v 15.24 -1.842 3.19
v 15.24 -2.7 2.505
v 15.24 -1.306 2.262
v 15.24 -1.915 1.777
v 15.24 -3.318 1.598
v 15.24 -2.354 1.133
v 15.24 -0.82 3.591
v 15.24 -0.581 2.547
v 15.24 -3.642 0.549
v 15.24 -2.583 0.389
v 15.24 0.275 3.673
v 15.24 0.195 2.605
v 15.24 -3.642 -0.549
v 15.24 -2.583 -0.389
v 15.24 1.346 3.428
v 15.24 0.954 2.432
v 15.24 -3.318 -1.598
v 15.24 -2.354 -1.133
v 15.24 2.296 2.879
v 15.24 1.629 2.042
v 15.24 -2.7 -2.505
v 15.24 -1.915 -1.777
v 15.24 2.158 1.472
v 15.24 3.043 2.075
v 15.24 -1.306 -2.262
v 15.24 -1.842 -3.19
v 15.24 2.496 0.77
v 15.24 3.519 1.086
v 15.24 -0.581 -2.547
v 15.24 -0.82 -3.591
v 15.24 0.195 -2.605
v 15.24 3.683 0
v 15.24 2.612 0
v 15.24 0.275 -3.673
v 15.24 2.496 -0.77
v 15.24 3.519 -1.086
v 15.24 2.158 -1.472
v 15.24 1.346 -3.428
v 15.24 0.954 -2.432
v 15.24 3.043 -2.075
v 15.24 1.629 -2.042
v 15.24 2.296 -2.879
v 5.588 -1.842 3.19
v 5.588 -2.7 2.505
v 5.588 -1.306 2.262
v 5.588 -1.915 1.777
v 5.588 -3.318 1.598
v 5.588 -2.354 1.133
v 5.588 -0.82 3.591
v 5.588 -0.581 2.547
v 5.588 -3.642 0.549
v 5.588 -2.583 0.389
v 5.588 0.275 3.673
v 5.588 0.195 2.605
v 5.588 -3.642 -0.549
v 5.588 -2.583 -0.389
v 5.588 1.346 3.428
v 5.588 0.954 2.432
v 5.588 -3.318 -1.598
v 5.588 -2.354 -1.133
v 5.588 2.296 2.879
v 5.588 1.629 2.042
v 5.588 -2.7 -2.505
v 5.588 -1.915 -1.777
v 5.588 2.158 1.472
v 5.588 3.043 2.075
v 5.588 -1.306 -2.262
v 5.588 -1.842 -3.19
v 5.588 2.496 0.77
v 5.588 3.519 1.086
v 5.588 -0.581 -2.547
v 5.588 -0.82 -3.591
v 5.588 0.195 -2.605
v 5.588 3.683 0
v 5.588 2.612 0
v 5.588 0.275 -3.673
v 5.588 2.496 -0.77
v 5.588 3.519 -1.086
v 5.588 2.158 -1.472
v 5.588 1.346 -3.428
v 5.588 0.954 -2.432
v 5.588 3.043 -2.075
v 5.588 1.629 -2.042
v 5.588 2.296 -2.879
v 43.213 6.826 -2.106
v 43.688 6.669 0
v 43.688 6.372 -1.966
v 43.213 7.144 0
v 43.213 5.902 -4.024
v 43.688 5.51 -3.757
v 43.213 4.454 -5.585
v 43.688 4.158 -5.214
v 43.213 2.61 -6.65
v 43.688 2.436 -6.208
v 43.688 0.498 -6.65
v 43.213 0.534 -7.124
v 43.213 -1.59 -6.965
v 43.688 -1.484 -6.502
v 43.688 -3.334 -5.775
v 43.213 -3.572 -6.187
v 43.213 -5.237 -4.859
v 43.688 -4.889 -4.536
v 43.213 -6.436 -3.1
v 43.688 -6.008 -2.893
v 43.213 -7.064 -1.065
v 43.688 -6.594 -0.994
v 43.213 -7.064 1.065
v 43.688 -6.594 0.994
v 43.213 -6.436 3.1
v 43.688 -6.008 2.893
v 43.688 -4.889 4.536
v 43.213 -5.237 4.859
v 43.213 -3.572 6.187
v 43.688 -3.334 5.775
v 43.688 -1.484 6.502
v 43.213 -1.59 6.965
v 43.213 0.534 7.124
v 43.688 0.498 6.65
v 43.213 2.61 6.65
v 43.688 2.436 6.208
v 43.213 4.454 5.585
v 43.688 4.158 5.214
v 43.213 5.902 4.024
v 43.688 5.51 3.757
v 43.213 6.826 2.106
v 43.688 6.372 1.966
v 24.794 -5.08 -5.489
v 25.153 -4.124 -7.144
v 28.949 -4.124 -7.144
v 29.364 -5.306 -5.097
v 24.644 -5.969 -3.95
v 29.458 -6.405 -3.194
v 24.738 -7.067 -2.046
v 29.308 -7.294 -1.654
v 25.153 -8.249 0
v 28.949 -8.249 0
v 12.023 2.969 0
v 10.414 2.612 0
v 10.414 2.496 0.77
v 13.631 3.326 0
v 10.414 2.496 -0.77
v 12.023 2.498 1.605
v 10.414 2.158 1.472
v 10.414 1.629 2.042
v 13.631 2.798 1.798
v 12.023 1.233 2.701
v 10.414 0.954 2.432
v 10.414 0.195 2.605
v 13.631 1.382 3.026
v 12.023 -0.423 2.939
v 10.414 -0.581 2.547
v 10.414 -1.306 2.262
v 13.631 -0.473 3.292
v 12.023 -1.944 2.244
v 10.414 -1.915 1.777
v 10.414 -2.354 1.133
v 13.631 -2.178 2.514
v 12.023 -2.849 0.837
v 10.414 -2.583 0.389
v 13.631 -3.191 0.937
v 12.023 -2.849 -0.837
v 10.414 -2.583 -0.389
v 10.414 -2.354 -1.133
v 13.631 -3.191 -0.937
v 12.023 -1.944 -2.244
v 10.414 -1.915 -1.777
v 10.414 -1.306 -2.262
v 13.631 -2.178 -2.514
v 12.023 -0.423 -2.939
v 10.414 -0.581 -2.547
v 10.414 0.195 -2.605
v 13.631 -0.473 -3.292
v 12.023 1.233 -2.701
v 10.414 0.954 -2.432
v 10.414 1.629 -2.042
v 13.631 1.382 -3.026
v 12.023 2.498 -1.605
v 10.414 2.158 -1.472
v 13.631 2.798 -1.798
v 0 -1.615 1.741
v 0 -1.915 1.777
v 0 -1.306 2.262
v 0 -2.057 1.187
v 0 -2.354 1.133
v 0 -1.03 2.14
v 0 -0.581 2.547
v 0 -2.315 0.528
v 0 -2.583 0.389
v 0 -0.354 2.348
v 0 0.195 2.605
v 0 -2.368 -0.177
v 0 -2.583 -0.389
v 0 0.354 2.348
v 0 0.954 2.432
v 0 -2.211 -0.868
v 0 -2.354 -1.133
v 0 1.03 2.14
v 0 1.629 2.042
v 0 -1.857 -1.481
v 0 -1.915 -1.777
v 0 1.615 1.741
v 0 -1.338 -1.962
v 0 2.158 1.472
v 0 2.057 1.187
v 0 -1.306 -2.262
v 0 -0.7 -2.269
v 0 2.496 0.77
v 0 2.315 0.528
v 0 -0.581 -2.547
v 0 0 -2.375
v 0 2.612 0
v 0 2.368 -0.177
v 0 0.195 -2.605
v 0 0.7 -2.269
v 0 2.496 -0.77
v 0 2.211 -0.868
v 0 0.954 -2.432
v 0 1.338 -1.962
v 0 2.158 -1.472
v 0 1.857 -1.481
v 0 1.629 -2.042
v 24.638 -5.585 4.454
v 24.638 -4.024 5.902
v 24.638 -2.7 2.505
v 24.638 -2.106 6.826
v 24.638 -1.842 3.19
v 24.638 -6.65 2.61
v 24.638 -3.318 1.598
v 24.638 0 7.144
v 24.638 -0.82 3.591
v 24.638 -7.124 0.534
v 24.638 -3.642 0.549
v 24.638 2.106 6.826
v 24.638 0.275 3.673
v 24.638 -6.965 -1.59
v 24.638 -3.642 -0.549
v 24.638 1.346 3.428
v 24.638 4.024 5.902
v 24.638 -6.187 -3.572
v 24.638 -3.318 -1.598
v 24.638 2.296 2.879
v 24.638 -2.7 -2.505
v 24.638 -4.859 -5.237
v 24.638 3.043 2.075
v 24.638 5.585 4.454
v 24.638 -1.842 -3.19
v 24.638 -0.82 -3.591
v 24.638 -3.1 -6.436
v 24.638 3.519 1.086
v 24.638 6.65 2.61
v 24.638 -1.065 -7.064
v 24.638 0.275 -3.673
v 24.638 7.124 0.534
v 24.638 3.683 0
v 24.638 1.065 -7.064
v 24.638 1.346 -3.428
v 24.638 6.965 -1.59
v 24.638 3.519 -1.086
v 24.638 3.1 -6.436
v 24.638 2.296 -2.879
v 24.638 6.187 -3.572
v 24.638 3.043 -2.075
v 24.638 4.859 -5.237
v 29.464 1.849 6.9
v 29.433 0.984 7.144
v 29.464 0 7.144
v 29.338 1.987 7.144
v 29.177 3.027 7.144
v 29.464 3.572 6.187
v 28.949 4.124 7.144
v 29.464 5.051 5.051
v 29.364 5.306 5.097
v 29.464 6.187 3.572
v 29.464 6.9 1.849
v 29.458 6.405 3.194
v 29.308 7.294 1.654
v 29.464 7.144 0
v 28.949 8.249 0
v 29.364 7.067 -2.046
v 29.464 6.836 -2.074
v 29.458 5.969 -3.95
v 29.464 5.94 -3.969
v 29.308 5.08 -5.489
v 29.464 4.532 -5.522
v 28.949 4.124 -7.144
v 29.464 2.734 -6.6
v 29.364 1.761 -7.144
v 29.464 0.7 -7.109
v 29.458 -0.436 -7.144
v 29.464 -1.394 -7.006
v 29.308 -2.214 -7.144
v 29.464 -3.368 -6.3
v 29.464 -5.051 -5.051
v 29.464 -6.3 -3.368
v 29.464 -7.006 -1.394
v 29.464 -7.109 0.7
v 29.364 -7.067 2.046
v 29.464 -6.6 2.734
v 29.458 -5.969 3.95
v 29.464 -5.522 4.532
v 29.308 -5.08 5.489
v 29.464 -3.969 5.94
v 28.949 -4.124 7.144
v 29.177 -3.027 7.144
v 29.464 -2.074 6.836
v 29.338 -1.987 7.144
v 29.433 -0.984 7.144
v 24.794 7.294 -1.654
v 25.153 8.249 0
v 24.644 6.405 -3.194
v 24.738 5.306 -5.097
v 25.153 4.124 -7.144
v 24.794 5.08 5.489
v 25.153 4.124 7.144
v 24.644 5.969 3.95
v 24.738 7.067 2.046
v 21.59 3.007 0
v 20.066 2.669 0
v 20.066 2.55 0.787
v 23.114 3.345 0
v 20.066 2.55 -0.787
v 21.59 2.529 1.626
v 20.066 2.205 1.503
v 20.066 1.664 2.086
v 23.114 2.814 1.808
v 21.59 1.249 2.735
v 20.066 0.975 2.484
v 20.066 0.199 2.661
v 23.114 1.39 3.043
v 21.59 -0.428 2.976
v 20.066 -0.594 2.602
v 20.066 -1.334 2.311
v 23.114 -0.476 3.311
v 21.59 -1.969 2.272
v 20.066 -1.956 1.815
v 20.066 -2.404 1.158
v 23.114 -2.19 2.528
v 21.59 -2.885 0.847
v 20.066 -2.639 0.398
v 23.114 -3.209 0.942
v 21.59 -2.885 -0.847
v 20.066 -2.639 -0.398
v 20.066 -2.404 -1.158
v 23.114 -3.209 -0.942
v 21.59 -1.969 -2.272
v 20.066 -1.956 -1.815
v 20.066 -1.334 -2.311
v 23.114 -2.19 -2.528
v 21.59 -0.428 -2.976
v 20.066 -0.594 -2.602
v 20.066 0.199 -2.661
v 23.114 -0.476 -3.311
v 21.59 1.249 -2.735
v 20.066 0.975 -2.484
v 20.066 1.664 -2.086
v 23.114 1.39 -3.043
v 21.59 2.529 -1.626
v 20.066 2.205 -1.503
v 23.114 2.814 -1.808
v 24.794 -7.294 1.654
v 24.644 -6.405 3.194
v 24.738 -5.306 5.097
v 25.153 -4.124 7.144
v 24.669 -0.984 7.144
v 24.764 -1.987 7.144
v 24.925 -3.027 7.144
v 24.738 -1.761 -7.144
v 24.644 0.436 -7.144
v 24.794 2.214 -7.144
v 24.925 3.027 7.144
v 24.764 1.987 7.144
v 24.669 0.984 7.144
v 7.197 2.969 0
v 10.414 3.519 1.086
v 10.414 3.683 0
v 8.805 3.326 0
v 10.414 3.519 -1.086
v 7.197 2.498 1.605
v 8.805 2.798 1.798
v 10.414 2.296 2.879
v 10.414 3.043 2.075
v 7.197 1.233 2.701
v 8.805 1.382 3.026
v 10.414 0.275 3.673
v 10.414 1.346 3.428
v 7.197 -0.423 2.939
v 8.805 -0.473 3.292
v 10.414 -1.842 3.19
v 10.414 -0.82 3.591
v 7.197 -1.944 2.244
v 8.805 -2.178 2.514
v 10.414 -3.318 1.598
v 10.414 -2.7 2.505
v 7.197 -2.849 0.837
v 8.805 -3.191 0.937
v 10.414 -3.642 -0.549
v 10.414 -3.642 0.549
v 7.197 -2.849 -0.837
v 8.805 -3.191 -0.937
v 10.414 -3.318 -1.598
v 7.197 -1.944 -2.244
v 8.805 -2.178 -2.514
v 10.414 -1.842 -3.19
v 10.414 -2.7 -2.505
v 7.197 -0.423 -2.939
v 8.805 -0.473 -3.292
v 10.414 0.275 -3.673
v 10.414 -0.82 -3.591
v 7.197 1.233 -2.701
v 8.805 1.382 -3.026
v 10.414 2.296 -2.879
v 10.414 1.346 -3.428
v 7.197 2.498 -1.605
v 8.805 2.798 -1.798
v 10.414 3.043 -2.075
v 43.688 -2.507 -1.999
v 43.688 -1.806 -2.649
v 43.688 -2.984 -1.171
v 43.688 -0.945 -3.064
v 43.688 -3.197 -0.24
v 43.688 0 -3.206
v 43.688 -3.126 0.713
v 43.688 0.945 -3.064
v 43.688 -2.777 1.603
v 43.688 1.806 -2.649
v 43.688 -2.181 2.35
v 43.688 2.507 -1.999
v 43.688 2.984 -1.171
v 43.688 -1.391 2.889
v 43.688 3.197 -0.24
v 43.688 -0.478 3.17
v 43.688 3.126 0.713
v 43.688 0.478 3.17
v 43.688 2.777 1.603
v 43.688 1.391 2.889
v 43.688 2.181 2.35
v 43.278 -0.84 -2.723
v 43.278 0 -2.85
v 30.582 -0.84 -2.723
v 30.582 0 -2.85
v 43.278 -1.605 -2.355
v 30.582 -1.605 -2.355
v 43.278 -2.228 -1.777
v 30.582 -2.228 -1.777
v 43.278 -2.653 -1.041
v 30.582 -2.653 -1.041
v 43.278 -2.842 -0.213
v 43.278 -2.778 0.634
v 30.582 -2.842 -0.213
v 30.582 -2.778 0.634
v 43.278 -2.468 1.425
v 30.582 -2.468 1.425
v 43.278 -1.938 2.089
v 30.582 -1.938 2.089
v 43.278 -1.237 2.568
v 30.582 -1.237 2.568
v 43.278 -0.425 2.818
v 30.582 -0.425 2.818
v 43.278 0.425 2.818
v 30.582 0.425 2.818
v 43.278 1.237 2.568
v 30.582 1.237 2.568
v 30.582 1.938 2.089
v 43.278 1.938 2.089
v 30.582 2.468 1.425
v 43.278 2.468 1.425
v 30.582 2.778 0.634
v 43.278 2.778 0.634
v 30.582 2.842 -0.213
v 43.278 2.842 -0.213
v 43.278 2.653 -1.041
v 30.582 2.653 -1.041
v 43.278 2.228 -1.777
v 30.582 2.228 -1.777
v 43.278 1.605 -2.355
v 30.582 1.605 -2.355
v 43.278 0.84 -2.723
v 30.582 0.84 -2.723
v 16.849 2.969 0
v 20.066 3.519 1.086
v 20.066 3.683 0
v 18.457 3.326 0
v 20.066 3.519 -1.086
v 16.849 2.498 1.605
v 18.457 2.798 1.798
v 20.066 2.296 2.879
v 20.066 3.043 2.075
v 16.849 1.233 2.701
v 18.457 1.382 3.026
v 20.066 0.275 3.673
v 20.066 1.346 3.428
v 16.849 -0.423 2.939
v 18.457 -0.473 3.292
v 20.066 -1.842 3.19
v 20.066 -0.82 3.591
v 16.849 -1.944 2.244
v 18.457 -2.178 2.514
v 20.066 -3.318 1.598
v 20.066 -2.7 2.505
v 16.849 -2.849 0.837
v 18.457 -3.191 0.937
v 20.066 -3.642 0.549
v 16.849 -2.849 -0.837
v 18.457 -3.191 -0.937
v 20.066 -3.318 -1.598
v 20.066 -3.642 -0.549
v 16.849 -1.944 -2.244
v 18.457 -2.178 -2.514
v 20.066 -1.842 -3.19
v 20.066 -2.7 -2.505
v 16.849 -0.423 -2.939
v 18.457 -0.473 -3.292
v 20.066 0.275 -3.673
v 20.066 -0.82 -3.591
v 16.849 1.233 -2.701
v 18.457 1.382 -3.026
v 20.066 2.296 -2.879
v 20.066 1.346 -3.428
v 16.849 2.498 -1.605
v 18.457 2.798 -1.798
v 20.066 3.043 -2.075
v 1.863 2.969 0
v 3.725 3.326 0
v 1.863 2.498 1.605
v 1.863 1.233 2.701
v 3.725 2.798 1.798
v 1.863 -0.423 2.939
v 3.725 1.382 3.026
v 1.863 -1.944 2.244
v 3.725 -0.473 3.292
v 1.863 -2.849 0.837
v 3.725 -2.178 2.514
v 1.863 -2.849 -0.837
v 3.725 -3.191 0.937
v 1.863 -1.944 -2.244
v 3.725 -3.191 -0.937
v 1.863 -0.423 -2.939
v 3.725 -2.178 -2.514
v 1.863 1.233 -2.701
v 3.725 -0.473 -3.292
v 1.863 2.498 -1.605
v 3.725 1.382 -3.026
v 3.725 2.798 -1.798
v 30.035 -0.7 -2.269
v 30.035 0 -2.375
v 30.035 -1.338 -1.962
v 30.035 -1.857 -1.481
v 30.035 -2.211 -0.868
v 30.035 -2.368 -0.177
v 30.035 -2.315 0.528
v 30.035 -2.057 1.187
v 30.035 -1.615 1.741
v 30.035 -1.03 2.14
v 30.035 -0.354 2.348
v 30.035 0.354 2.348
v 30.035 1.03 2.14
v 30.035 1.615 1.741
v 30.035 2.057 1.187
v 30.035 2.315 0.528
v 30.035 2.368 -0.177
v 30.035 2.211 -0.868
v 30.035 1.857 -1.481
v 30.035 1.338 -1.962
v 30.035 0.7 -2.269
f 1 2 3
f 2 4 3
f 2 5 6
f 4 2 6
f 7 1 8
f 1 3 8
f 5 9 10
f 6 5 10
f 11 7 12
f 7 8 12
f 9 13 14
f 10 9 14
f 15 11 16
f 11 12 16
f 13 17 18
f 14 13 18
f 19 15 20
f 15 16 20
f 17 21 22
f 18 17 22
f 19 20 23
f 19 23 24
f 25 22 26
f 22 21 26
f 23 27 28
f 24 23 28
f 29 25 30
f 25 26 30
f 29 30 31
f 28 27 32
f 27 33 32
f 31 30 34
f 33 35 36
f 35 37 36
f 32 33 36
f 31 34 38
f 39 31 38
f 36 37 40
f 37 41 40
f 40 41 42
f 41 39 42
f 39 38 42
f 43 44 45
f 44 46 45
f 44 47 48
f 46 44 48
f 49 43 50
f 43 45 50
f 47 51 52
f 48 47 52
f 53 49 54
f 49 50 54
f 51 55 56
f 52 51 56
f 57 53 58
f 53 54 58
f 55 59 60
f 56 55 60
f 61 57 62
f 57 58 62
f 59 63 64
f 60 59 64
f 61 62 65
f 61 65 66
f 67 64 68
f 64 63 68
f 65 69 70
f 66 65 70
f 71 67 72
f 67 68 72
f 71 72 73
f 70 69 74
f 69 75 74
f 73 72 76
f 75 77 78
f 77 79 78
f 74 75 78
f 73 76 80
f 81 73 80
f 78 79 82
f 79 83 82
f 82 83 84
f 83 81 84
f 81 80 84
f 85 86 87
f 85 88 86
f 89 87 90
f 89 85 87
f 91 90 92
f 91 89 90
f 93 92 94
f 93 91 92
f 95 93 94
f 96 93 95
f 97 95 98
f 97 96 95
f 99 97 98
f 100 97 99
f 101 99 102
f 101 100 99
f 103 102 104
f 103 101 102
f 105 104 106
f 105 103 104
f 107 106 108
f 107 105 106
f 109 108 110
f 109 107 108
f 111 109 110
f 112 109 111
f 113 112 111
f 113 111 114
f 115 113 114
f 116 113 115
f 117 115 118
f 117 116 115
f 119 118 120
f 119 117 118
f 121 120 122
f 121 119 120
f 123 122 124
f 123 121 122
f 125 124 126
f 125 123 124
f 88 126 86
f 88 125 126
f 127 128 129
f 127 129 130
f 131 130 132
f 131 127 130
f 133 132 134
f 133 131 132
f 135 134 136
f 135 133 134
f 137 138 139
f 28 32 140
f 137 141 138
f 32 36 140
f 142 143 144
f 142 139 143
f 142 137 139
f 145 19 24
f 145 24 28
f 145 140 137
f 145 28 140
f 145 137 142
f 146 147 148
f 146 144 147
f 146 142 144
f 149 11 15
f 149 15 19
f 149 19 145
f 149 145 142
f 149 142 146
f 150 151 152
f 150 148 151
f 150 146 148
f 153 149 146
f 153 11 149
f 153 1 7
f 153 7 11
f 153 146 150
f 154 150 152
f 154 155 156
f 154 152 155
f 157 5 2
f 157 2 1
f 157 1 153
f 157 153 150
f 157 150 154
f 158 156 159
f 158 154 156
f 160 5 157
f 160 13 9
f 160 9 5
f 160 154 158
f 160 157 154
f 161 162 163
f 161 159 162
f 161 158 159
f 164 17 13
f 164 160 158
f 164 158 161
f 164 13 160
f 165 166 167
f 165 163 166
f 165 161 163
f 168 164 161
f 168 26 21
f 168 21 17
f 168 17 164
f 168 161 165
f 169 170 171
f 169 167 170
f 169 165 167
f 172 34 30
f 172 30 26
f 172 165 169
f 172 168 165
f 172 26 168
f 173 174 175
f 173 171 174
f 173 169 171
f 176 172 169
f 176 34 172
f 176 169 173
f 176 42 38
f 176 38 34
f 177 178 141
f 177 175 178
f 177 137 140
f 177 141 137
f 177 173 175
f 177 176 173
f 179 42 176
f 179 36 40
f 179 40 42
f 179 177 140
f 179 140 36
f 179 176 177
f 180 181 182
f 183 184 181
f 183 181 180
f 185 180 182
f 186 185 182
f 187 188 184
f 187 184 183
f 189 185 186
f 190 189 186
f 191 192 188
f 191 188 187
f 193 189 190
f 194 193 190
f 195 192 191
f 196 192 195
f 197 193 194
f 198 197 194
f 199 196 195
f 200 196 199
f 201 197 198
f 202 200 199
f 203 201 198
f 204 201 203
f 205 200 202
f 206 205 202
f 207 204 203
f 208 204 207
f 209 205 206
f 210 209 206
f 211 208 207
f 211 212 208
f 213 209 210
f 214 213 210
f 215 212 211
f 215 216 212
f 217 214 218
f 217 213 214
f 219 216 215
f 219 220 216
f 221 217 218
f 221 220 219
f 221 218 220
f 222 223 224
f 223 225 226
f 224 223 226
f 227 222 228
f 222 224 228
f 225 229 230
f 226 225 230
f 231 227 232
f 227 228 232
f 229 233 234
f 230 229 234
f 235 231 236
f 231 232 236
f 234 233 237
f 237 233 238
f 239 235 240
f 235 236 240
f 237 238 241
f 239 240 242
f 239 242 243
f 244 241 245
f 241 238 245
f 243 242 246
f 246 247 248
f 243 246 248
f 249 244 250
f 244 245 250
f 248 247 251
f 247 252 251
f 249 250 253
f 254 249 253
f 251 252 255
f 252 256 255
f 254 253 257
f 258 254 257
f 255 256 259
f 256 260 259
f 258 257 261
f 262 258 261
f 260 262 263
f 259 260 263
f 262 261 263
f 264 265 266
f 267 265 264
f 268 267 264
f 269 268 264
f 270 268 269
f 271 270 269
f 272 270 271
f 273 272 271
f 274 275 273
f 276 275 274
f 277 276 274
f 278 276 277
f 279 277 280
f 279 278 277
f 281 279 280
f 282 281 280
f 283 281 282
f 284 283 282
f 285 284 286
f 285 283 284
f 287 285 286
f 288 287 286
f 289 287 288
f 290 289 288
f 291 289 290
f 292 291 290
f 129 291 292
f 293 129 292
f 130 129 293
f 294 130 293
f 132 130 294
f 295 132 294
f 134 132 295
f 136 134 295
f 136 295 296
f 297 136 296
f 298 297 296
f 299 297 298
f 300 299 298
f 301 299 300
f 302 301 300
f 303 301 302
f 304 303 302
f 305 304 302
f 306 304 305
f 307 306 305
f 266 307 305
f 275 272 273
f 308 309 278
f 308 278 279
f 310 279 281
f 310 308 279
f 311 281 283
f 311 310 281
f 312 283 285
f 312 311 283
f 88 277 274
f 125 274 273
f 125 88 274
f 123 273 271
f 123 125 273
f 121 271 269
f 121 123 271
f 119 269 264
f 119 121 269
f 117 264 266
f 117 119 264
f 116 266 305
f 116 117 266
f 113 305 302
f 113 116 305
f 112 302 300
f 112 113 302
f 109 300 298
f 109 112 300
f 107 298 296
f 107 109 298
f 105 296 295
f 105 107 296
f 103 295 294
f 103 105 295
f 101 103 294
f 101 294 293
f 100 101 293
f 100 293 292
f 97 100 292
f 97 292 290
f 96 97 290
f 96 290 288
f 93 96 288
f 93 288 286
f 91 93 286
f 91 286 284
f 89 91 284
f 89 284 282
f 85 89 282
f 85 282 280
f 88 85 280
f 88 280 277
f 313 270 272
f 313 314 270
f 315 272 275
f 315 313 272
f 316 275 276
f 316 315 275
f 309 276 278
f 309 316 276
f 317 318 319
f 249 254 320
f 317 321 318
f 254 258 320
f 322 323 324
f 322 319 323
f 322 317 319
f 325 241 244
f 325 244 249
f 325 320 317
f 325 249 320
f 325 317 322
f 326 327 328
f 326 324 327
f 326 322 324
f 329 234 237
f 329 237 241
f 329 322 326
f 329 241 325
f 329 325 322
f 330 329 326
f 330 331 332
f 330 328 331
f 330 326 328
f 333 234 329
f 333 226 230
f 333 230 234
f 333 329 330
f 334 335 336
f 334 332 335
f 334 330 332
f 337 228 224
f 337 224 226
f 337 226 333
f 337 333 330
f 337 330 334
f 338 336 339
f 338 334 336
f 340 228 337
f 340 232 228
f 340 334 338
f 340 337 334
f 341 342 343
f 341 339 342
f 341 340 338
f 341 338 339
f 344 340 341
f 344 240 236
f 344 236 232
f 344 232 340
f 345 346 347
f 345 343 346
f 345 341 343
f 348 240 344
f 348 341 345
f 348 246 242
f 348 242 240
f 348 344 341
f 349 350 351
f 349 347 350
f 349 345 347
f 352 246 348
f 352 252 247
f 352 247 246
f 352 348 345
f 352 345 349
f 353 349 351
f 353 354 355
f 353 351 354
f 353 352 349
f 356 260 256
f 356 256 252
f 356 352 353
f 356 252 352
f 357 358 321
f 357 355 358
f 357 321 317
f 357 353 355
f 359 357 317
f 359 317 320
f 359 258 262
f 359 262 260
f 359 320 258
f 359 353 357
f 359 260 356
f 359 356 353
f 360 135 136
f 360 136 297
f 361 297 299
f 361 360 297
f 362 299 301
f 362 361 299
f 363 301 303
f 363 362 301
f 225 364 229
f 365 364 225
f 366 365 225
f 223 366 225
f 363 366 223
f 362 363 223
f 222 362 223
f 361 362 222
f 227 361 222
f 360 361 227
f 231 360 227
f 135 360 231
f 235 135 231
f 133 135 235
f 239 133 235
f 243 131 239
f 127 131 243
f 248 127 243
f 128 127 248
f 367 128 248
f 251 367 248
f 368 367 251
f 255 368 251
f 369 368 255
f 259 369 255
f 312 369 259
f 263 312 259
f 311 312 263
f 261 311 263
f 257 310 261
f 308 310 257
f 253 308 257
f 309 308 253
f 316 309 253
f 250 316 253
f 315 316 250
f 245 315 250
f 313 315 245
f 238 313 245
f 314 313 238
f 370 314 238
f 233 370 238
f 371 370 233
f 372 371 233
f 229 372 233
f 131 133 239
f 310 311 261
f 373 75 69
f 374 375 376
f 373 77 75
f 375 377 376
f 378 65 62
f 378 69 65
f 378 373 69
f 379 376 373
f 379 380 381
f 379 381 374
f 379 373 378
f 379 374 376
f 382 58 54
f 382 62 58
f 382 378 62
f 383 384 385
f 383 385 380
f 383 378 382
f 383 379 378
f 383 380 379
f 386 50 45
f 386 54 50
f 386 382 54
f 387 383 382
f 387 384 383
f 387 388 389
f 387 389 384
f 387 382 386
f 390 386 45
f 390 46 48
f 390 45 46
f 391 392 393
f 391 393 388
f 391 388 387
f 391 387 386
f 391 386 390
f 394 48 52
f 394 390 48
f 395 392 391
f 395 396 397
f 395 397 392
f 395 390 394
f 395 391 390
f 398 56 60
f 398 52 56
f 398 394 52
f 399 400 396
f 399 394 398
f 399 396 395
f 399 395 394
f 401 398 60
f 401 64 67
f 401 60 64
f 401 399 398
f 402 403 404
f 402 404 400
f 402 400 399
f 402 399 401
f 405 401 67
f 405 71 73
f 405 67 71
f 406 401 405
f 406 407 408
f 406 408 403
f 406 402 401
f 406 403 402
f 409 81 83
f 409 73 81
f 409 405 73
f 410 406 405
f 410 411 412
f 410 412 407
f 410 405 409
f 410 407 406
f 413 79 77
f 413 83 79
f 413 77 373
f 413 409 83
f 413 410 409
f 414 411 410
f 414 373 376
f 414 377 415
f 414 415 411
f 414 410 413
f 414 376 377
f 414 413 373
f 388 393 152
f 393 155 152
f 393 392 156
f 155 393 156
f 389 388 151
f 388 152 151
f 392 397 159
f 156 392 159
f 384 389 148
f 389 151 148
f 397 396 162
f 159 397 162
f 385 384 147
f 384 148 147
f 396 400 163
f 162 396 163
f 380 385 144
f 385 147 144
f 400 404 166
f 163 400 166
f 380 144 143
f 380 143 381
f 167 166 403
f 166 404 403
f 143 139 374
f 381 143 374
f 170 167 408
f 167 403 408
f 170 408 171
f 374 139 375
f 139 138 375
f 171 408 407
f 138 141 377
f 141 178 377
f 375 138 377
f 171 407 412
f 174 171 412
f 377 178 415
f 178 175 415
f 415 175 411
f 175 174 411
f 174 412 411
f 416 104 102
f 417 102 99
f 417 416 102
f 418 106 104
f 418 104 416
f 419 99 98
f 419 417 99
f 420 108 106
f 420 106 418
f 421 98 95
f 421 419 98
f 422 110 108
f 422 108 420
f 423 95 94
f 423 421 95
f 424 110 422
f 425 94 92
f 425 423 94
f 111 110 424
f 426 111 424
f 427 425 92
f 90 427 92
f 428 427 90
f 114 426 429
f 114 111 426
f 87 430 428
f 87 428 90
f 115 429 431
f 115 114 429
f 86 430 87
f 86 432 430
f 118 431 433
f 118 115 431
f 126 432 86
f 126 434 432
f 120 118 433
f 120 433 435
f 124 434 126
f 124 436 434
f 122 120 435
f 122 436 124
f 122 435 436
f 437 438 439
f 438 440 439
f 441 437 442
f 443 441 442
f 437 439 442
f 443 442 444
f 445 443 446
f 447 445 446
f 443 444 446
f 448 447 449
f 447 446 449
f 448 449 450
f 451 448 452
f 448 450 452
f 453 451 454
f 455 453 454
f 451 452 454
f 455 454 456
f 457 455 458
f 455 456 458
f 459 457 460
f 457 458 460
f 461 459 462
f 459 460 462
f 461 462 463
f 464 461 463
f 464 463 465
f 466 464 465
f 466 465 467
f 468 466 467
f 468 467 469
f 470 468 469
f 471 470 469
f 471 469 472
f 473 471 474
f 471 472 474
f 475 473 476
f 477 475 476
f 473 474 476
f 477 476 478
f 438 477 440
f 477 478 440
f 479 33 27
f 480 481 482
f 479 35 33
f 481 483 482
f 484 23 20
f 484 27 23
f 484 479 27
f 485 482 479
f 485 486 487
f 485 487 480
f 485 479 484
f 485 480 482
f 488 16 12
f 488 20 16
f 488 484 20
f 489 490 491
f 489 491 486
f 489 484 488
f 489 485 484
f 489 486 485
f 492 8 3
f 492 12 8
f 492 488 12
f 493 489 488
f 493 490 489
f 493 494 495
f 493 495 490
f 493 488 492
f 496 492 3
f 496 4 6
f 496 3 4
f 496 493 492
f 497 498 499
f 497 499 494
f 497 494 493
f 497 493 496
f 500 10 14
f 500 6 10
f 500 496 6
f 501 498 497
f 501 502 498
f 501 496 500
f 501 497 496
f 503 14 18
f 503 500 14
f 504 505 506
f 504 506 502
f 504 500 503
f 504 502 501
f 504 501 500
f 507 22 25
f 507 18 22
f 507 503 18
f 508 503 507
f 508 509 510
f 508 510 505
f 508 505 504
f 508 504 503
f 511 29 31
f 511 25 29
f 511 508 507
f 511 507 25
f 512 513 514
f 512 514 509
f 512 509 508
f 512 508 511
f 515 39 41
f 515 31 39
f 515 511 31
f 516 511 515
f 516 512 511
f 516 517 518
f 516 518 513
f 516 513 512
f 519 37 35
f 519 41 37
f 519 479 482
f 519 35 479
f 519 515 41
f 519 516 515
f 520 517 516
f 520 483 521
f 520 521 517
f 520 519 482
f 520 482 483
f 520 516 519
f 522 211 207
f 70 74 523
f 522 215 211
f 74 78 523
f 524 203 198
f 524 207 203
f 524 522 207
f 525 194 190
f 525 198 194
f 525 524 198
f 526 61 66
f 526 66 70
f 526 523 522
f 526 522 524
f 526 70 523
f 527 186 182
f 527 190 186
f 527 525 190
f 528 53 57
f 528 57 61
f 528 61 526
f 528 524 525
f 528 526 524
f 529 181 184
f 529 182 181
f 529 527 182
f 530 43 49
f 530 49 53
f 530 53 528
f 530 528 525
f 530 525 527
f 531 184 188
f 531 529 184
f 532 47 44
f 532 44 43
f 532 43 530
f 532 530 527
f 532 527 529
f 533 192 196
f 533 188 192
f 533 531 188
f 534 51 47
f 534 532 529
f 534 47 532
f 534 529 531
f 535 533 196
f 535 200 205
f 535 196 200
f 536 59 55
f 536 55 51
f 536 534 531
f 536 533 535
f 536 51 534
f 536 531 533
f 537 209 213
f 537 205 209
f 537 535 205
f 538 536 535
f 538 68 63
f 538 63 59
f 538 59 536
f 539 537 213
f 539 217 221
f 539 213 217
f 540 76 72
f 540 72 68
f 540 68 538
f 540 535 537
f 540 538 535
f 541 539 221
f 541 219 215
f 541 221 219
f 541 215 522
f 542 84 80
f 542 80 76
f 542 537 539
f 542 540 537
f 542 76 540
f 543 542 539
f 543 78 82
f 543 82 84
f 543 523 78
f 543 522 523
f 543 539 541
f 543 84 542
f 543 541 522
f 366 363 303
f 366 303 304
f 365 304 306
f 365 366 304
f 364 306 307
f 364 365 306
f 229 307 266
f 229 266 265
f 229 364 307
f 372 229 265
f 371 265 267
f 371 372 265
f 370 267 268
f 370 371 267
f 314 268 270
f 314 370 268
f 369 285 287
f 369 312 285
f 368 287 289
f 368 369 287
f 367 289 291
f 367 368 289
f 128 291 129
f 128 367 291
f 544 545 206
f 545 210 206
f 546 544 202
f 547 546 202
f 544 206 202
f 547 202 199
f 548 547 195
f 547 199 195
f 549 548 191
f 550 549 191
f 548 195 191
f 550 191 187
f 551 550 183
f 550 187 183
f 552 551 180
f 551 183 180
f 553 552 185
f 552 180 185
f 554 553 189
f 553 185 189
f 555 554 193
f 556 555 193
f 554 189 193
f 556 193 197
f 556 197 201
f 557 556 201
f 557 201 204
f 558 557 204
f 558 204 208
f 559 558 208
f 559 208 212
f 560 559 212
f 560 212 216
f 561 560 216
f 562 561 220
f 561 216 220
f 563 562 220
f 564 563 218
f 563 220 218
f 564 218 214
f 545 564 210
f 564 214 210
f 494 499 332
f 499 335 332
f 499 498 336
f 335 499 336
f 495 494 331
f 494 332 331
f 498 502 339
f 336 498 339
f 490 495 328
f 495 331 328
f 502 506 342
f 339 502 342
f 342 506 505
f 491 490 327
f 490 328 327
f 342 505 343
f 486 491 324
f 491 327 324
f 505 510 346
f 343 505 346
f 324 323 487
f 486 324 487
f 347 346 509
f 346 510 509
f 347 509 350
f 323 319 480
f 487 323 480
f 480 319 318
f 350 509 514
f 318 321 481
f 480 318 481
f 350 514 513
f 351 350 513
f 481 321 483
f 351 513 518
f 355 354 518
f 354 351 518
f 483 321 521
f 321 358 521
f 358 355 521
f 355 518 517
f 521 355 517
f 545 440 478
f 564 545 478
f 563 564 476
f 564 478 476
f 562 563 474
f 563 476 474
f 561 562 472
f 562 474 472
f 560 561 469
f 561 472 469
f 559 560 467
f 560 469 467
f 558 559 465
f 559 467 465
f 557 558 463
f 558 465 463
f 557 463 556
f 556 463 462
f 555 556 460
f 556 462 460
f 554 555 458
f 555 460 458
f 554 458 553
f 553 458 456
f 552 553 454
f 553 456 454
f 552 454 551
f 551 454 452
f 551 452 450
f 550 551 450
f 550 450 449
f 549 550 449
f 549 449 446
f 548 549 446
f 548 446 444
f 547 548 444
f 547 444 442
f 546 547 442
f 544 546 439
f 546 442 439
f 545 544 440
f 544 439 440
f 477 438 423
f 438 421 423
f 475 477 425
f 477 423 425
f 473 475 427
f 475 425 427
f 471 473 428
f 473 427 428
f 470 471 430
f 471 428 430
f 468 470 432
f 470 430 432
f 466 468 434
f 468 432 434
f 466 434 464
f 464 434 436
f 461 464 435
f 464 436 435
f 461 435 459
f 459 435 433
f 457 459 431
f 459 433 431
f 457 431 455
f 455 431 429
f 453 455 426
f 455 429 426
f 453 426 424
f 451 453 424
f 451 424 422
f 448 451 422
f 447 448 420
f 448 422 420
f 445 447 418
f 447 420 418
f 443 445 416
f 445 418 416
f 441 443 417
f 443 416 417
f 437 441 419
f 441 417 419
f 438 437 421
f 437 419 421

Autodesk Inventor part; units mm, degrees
ref_plane "YZ Plane" through (0, 0, 0) normal (1, 0, 0) x (0, 1, 0)
ref_plane "XZ Plane" through (0, 0, 0) normal (0, 1, 0) x (-1, 0, 0)
sketch "Sketch8" plane through (10.3632, 0, 0) normal (0, 0, 1) x (0, 1, 0)
  line L0 (3.683, -14.2748) -> (0, -14.2748)
  line L1 (0, -14.2748) -> (0, 10.3632)
  line L2 (0, -14.2748) -> (3.683, -14.2748)
  line L3 (3.683, 4.7752) -> (2.6124, 4.7752)
  line L4 (2.6124, 10.3632) -> (0, 10.3632)
  line L5 (2.6124, 10.3632) -> (3.683, 4.7752)
  line L6 (2.6124, 4.7752) -> (3.683, -0.0508)
  line L7 (2.6124, -0.0508) -> (3.683, -4.8768)
  line L8 (3.683, -0.0508) -> (2.6124, -0.0508)
  line L9 (3.683, -4.8768) -> (2.6124, -4.8768)
  line L10 (2.6124, -4.8768) -> (3.683, -9.7028)
  line L11 (3.683, -9.7028) -> (2.6687, -9.7028)
  line L12 (2.6687, -9.7028) -> (3.683, -14.2748)
  point P0 (0, 10.3632)
  dimension "d67" = 7.366
  dimension "d68" = 5.588
  dimension "d66" = 4.826
  dimension "d65" = 4.826
  dimension "d64" = 4.826
  dimension "d69" = 5.2248
  dimension "d87" = 24.638
revolve "Revolution5" add sketch "Sketch8" angle 360 about axis through (24.638, 0, 0) along (-1, 0, 0)
sketch "Sketch1" plane through (24.638, 0, 0) normal (1, 0, 0) x (0, 0, -1)
  line L0 (7.1437, 4.1244) -> (7.1438, -4.1244)
  line L1 (7.1438, -4.1244) -> (0, -8.2489)
  line L2 (0, -8.2489) -> (-7.1437, -4.1244)
  line L3 (-7.1437, -4.1244) -> (-7.1437, 4.1244)
  line L4 (-7.1437, 4.1244) -> (0, 8.2489)
  line L5 (0, 8.2489) -> (7.1437, 4.1244)
  circle A0 centre (0, 0) radius 3.683 projected
  dimension "d51" = 14.2875
extrude "Extrusion1" add sketch "Sketch1" along normal blind 4.826 contours L0 L1 L2 L3 L4 L5 | A0
sketch "Sketch6" plane through (0, 0, 0) normal (0, 0, 1) x (1, 0, 0)
  line L0 (-8.7376, 0) -> (52.4256, 0) projected
  line L1 (29.464, -4.1244) -> (29.464, 4.1244) projected
  line L2 (29.464, 0) -> (29.464, 7.1437)
  line L3 (29.464, 7.1437) -> (43.688, 7.1437)
  line L4 (43.688, 7.1437) -> (43.688, 0)
  line L5 (29.464, 0) -> (43.688, 0)
  line L6 (0, -2.6124) -> (0, 2.6124) projected
  dimension "d73" = 14.2875
  dimension "d74" = 43.688
revolve "Revolution3" add sketch "Sketch6" angle 360 about axis through (-10, 0, 0) along (1, 0, 0)
chamfer "Chamfer1" distance 0.475 angle 45 1 edges at (43.688, -7.1437, 0)
sketch "Sketch7" plane through (0, 0, 0) normal (0, 1, 0) x (-1, 0, 0)
  line L0 (-24.638, 7.1437) -> (-24.638, 10.7156)
  line L1 (-24.638, 10.7156) -> (-26.3036, 10.7156)
  line L2 (-26.3036, 10.7156) -> (-24.638, 7.1437)
  line L3 (-29.464, 7.1437) -> (-29.464, 10.7156)
  line L4 (-29.464, 10.7156) -> (-27.7984, 10.7156)
  line L5 (-27.7984, 10.7156) -> (-29.464, 7.1437)
  line L6 (-23.6728, 0) -> (-30.4292, 0) projected
  dimension "d75" = 3.5719
  dimension "d76" = 25
revolve "Revolution4" cut sketch "Sketch7" angle 360 about axis through (-10, 0, 0) along (1, 0, 0)
hole "Hole1" at (43.688, 0, 0) direction (-1, 0, 0) diameter 5.6998 depth 13.1064 countersink diameter 6.4122 countersink angle 82
hole "Hole2" at (30.5816, 0, 0) direction (-1, 0, 0) diameter 4.7498 end through all countersink diameter 5.6998 countersink angle 82
sketch "Sketch9" plane through (0, 0, 0) normal (0, 0, 1) x (1, 0, 0)
  line L0 (30.5562, 6.4654) -> (30.5562, -9.2124)
  line L1 (29.464, 0) -> (29.464, -6.1867) projected
  dimension "d86" = 1.0922
split_face "Split1"
thread "Rosca1" size "1/4" designation "1/4 - 18 NPT" standard "NPT for PVC Pipe and Fitting" full length
ref_plane "Work Plane2" through (29.464, 0, 0) normal (-1, 0, 0) x (0, 0, 1)
equation "\"d67\" = OD"
equation "\"d68\" = L1"
equation "\"d66\" = L2"
equation "\"d65\" = L2"
equation "\"d64\" = L2"
equation "\"d69\" = 1.1 * D1"
equation "\"d87\" = M"
equation "\"d51\" = C_HEX"
equation "\"d1\" = C_HEX_L"
equation "\"d73\" = C_HEX"
equation "\"d74\" = L"
equation "\"d37\" = 0.1 * D1"
equation "\"d75\" = 0.25 * C_HEX"
equation "\"d54\" = 1.2 * D1"
equation "\"d56\" = 1.35 * D1"
equation "\"d59\" = 0.3 * L"
equation "\"d79\" = D1"
equation "\"d81\" = 1.2 * D1"
equation "\"d86\" = 0.025 * L"
equation "\"C_HEX\" = 14.2875"
equation "\"L\" = 43.688"
equation "\"M\" = 24.638"
equation "\"OD\" = 7.366"
equation "\"D1\" = 4.7498"
equation "\"d6\" = 0.2 * M"
equation "\"d7\" = 0.2 * M"
equation "\"d8\" = 0.2 * M"
equation "\"d9\" = 0.2 * M"
equation "\"L1\" = 5.588"
equation "\"L2\" = 4.826"
equation "\"C_HEX_L\" = 4.826"
equation "\"d88\" = -C_HEX_L"
equation "\"Parker_No\" = 1.2345"
properties part number "Terminación de manguera para tubería macho 125HBL de Parker 125HBL-4-4" material "Latón, amarillo claro"
